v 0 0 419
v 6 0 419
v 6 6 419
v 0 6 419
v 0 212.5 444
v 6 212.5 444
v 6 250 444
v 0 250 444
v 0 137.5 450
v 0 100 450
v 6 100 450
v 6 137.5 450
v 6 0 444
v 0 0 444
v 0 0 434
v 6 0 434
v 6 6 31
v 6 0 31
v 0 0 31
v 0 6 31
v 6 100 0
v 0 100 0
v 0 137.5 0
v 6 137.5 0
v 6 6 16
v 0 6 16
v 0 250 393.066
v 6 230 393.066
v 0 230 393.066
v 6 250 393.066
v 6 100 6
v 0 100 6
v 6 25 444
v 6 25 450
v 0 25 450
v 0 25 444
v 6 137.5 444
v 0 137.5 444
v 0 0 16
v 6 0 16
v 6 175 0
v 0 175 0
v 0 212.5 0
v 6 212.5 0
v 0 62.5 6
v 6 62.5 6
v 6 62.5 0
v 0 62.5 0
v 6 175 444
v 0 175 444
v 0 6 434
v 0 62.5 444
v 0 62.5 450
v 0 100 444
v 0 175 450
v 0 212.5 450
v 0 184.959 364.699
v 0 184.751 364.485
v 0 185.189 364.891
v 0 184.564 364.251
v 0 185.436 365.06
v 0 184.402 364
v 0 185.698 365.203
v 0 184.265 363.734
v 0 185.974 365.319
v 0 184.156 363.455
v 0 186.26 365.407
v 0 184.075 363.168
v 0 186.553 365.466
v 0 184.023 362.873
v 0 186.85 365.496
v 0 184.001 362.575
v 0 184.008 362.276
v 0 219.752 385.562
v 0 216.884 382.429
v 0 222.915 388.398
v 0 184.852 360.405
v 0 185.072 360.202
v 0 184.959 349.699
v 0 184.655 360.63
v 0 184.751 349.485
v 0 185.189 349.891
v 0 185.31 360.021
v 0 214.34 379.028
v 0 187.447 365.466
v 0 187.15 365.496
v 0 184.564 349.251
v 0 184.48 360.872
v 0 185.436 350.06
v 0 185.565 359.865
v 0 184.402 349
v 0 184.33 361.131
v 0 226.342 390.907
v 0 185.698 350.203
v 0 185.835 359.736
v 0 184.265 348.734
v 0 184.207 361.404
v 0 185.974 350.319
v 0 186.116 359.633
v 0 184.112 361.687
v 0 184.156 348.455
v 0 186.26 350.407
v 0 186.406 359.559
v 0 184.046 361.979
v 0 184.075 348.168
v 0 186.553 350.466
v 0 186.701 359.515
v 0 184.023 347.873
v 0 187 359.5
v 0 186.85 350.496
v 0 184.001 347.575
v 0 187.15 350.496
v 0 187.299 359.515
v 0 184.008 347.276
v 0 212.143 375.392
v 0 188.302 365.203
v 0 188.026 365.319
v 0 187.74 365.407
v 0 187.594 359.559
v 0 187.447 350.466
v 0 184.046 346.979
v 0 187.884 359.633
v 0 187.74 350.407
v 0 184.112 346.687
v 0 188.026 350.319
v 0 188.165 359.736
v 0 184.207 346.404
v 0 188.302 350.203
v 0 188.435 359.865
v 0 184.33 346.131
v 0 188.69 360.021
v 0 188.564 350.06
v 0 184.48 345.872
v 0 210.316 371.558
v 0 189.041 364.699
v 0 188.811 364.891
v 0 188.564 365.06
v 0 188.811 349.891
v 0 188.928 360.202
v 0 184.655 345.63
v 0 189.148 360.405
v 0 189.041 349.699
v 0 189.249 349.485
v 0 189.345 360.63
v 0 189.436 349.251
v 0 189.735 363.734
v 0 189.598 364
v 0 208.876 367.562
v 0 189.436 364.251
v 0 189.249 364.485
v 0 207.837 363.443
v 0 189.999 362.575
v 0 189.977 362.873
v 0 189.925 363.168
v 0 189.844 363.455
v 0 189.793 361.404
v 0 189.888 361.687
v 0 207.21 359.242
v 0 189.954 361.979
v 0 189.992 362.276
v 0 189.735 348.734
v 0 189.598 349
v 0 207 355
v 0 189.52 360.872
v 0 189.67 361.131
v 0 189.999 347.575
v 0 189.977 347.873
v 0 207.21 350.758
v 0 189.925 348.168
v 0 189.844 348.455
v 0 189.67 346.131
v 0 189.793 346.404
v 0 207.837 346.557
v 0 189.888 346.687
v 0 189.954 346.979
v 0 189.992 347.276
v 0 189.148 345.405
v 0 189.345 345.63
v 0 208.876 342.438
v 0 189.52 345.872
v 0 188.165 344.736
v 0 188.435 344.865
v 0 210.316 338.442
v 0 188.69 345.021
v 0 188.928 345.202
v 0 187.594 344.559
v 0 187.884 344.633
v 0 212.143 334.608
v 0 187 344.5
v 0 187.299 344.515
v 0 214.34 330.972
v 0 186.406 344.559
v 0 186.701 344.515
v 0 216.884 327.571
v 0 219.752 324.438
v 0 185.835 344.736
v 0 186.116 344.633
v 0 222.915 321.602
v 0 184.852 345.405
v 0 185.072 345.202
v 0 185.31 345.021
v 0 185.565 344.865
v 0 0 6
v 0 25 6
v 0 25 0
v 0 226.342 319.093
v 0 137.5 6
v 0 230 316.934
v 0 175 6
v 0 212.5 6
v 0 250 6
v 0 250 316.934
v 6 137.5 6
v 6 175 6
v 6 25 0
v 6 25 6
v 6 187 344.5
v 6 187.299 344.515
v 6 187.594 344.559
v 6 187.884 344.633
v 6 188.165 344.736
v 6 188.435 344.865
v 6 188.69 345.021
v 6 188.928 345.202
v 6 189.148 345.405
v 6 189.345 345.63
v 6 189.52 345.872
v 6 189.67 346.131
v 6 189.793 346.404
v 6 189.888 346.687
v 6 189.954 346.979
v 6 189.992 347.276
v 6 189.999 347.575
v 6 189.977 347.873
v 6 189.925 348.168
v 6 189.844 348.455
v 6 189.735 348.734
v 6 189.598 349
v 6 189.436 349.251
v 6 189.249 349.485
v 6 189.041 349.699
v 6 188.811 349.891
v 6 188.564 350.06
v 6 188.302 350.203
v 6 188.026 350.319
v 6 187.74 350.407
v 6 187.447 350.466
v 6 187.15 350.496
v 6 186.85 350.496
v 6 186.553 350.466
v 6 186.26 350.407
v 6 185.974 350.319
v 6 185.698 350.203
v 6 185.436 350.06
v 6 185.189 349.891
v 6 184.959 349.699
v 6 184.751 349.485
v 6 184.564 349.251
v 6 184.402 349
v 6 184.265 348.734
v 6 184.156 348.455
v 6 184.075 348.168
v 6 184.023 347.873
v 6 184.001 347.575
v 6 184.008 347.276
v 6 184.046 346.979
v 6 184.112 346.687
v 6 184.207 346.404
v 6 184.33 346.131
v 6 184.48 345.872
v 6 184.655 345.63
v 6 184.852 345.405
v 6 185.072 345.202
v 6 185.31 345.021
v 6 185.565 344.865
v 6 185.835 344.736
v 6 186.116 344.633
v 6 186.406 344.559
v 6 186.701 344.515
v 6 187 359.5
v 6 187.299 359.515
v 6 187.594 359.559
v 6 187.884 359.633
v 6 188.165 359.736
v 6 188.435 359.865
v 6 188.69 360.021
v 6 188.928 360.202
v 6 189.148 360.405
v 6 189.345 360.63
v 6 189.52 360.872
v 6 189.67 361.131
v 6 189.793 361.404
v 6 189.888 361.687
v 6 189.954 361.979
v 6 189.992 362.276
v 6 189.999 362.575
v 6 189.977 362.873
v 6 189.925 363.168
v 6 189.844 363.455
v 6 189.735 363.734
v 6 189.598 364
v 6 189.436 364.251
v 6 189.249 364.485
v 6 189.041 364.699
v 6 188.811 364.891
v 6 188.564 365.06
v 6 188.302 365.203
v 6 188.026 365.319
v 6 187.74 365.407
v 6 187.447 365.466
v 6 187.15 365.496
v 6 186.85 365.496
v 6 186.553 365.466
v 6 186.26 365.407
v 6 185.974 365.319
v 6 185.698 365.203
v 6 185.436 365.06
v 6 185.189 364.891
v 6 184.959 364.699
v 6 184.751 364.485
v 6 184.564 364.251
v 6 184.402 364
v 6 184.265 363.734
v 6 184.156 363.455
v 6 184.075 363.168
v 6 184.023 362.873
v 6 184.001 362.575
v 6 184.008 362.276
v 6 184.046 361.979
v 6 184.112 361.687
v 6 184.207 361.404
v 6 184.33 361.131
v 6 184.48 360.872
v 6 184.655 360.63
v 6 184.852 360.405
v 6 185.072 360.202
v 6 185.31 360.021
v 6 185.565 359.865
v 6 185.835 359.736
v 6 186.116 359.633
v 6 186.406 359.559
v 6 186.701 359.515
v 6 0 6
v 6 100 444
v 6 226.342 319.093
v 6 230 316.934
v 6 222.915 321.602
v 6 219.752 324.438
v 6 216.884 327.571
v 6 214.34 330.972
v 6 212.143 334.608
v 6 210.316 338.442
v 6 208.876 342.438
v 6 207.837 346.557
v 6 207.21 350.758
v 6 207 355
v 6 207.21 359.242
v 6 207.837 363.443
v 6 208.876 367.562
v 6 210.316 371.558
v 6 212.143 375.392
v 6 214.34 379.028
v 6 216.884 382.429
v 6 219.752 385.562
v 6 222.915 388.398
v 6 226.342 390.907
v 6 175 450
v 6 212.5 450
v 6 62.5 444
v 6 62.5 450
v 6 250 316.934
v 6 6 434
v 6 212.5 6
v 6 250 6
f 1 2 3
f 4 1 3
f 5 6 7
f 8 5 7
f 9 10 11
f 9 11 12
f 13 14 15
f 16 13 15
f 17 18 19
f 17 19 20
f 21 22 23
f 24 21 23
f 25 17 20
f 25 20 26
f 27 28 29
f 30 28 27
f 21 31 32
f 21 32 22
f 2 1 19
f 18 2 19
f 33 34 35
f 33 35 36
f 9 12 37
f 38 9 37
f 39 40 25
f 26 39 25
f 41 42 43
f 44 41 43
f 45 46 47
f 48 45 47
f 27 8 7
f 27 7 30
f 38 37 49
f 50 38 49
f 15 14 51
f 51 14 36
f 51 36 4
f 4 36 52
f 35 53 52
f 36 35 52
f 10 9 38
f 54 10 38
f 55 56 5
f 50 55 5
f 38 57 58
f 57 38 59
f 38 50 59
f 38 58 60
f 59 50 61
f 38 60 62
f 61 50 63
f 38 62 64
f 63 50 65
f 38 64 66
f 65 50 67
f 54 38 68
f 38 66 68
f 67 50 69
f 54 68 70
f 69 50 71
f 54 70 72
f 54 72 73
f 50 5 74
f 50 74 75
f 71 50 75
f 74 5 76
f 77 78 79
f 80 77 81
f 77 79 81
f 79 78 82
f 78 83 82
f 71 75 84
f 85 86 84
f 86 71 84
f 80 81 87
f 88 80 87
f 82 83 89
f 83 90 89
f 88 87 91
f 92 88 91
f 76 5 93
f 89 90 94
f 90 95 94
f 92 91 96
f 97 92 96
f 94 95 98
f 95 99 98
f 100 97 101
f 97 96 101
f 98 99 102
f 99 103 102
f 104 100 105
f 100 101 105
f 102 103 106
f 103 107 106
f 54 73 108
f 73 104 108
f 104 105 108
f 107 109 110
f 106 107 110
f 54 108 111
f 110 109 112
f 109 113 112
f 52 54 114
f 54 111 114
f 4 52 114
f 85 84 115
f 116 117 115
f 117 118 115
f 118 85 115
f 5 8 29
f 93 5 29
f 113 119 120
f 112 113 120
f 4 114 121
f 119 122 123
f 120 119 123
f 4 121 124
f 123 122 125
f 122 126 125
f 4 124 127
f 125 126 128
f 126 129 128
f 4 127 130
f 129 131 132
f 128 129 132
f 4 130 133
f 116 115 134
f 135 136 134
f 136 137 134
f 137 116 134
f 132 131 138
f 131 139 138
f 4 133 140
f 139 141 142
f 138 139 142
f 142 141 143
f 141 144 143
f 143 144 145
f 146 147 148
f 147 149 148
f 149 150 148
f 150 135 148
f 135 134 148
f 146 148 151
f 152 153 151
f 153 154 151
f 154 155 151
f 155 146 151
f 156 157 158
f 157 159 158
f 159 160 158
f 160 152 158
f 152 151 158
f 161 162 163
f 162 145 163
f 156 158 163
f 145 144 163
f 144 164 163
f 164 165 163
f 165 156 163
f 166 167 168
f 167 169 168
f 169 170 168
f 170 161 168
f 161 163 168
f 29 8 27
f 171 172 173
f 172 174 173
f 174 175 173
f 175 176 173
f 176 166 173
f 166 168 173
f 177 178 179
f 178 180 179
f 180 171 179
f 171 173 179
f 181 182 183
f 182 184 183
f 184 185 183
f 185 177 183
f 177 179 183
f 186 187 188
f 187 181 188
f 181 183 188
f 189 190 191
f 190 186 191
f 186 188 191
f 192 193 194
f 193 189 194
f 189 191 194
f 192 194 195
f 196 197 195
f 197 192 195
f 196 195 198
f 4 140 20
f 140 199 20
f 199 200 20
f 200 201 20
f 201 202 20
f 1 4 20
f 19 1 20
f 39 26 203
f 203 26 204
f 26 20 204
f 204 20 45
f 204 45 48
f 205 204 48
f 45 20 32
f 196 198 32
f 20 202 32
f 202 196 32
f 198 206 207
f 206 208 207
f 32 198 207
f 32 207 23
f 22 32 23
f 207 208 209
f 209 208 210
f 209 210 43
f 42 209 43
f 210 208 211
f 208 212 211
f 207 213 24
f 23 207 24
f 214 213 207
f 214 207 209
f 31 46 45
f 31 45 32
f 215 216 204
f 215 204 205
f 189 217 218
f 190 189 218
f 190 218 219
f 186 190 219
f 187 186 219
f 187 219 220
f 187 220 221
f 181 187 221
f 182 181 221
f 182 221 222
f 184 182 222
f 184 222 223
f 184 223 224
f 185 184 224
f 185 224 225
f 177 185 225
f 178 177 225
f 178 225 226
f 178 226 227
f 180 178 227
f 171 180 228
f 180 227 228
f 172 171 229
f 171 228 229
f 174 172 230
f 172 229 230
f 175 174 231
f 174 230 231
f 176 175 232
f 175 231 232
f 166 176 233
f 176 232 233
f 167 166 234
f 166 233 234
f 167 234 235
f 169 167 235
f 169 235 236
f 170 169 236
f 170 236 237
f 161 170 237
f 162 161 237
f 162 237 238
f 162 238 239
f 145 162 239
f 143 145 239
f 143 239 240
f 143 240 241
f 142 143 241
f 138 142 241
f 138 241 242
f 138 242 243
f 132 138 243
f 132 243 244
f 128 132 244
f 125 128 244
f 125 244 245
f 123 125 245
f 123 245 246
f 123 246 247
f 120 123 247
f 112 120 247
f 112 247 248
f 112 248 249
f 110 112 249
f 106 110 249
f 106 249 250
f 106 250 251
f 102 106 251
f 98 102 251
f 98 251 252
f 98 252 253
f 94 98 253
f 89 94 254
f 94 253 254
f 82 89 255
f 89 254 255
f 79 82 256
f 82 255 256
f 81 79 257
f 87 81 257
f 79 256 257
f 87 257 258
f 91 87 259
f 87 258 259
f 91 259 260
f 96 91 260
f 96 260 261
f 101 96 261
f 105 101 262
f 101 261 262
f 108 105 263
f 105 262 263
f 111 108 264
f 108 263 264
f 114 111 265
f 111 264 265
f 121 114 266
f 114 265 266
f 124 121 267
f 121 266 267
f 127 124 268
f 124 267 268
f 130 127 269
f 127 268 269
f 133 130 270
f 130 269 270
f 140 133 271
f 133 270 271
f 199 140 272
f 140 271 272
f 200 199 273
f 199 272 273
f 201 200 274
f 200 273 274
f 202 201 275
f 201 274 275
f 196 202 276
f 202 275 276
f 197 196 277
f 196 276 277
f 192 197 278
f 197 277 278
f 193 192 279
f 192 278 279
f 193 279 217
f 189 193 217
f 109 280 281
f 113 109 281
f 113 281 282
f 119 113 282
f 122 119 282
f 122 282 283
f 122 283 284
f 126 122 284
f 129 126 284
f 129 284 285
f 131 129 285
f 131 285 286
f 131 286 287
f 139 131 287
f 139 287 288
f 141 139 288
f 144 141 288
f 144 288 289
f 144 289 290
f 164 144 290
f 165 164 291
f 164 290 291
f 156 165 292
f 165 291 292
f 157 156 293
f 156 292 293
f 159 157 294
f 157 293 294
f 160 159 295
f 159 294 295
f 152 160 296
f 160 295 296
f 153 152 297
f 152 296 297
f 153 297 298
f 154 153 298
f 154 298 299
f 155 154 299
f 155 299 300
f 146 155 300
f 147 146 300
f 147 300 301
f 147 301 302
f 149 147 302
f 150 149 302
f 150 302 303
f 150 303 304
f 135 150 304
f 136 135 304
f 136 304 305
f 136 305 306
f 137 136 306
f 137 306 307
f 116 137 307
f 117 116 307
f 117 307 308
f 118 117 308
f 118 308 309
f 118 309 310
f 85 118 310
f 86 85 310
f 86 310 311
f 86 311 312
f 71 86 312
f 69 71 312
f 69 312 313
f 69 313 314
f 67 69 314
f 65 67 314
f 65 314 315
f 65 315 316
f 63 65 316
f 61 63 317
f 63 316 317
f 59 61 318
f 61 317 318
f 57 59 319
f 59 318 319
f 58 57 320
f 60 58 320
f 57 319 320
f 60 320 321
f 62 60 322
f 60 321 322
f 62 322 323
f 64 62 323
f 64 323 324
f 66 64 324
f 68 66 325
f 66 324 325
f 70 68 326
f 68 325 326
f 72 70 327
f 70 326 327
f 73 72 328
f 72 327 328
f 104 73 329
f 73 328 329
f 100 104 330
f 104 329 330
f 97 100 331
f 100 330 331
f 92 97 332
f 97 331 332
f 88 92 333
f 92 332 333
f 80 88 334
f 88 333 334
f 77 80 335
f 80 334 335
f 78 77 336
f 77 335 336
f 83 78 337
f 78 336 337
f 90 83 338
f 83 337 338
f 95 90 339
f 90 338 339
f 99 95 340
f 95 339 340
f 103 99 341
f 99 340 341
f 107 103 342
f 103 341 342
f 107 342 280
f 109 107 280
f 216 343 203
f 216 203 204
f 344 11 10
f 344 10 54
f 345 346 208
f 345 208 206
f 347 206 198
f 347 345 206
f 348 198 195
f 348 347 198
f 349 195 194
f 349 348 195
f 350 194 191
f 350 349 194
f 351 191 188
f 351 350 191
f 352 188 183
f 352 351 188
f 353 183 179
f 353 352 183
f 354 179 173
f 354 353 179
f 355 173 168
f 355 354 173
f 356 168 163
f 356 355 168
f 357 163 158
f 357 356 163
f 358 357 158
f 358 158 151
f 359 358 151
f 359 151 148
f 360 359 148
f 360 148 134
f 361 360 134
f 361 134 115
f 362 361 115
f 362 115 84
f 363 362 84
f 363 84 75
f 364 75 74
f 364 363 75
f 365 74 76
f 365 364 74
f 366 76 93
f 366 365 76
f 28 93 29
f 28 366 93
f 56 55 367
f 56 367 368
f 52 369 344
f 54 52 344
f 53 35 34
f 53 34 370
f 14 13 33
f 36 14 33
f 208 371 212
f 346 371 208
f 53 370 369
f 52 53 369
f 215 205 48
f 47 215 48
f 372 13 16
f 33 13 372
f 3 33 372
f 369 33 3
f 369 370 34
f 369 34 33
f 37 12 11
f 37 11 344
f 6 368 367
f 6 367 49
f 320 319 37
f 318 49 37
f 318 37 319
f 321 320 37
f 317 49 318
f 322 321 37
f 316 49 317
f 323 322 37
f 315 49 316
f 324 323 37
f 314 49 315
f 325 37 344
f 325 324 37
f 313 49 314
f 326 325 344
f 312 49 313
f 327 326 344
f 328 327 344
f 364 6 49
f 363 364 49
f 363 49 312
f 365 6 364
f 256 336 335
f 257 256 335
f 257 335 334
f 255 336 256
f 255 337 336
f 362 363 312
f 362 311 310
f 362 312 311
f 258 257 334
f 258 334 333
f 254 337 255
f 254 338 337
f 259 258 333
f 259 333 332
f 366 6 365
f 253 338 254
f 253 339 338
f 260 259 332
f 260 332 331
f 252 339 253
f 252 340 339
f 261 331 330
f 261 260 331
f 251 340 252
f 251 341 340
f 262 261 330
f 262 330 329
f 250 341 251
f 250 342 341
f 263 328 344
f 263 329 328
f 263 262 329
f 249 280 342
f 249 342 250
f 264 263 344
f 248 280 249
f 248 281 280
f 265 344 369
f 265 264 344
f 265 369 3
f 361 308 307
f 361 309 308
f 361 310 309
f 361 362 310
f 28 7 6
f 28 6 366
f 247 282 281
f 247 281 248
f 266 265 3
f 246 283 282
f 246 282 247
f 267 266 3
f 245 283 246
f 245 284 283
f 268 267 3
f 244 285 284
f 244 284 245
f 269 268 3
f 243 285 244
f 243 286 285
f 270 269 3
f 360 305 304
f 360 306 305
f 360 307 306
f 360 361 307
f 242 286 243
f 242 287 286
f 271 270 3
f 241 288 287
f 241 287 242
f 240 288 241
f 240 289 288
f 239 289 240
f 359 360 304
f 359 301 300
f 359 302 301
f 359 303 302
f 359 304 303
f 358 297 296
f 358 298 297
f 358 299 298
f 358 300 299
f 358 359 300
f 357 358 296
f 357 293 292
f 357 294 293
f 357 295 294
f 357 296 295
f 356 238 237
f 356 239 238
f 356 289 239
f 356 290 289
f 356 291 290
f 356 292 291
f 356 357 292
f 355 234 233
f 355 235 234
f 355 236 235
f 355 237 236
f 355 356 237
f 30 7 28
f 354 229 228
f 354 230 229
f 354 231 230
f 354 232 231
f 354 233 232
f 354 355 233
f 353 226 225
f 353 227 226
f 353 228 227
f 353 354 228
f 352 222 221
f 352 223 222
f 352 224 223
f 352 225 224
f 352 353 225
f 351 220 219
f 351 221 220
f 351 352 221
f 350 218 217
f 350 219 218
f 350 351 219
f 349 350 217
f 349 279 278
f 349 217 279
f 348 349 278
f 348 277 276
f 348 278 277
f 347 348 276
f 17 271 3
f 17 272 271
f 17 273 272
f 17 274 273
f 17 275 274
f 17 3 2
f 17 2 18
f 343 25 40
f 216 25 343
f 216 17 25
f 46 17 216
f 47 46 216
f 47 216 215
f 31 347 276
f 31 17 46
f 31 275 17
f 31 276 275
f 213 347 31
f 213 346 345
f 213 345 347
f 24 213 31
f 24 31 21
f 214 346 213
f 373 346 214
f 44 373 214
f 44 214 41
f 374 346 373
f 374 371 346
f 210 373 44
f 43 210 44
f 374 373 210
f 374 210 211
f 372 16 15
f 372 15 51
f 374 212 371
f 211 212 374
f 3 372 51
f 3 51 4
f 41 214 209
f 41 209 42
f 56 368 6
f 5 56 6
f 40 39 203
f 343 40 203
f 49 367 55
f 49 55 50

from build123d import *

# Parameters (mm, degrees)
SKETCH1_W            = 450
SKETCH1_H            = 250
BOSS_EXTRUDE1_DEPTH  = 6
SKETCH2_W            = 6
SKETCH2_H            = 37.5
CUT_EXTRUDE1_DEPTH   = 515.816472153
LPATTERN1_COUNT      = 4
LPATTERN1_PITCH      = 75
LPATTERN1_COUNT_DIR2 = 2
LPATTERN1_PITCH_DIR2 = 444
SKETCH3_W            = 15
SKETCH3_H            = 6
CUT_EXTRUDE2_DEPTH   = 515.816472153
LPATTERN2_COUNT      = 2
LPATTERN2_PITCH      = 403
SKETCH4_R            = 3
CUT_EXTRUDE3_DEPTH   = 10


with BuildPart() as part:
    # Sketch1 → Boss-Extrude1 (new body)
    with BuildSketch(Plane(origin=(0, 0, 0), x_dir=(0, 0, -1), z_dir=(1, 0, 0))):
        with Locations((-225, 125)):
            Rectangle(SKETCH1_W, SKETCH1_H)
    extrude(amount=BOSS_EXTRUDE1_DEPTH)

    # Sketch2 → Cut-Extrude1 (cut, through all)
    with BuildSketch(Plane(origin=(6, 0, 0), x_dir=(0, 0, -1), z_dir=(1, 0, 0))):
        with Locations((-447, 231.25)):
            Rectangle(SKETCH2_W, SKETCH2_H)
    cut_extrude1 = extrude(amount=-CUT_EXTRUDE1_DEPTH, mode=Mode.SUBTRACT)

    # LPattern1: Cut-Extrude1 4 × 2
    with Locations(*[(0, -i * LPATTERN1_PITCH, -j * LPATTERN1_PITCH_DIR2) for i in range(LPATTERN1_COUNT) for j in range(LPATTERN1_COUNT_DIR2) if (i, j) != (0, 0)]):
        add(cut_extrude1, mode=Mode.SUBTRACT)

    # Sketch3 → Cut-Extrude2 (cut, through all)
    with BuildSketch(Plane(origin=(6, 0, 0), x_dir=(0, 0, -1), z_dir=(1, 0, 0))):
        with Locations((-426.5, 3)):
            Rectangle(SKETCH3_W, SKETCH3_H)
    cut_extrude2 = extrude(amount=-CUT_EXTRUDE2_DEPTH, mode=Mode.SUBTRACT)

    # LPattern2: Cut-Extrude2 ×2
    with Locations(*[(0, 0, -i * LPATTERN2_PITCH) for i in range(1, LPATTERN2_COUNT)]):
        add(cut_extrude2, mode=Mode.SUBTRACT)

    # Sketch4 → Cut-Extrude3 (cut)
    with BuildSketch(Plane(origin=(6, 0, 0), x_dir=(0, 0, -1), z_dir=(1, 0, 0))):
        with Locations((-362.5, 187)):
            Circle(SKETCH4_R)
        with Locations((-347.5, 187)):
            Circle(SKETCH4_R)
        with BuildLine():
            Line((-393.065732621, 230), (-393.065732621, 250))
            Line((-393.065732621, 250), (-316.934267379, 250))
            Line((-316.934267379, 250), (-316.934267379, 230))
            ThreePointArc((-316.934267379, 230), (-355, 207), (-393.065732621, 230))
        make_face()
    extrude(amount=-CUT_EXTRUDE3_DEPTH, mode=Mode.SUBTRACT)


solid = part.part
